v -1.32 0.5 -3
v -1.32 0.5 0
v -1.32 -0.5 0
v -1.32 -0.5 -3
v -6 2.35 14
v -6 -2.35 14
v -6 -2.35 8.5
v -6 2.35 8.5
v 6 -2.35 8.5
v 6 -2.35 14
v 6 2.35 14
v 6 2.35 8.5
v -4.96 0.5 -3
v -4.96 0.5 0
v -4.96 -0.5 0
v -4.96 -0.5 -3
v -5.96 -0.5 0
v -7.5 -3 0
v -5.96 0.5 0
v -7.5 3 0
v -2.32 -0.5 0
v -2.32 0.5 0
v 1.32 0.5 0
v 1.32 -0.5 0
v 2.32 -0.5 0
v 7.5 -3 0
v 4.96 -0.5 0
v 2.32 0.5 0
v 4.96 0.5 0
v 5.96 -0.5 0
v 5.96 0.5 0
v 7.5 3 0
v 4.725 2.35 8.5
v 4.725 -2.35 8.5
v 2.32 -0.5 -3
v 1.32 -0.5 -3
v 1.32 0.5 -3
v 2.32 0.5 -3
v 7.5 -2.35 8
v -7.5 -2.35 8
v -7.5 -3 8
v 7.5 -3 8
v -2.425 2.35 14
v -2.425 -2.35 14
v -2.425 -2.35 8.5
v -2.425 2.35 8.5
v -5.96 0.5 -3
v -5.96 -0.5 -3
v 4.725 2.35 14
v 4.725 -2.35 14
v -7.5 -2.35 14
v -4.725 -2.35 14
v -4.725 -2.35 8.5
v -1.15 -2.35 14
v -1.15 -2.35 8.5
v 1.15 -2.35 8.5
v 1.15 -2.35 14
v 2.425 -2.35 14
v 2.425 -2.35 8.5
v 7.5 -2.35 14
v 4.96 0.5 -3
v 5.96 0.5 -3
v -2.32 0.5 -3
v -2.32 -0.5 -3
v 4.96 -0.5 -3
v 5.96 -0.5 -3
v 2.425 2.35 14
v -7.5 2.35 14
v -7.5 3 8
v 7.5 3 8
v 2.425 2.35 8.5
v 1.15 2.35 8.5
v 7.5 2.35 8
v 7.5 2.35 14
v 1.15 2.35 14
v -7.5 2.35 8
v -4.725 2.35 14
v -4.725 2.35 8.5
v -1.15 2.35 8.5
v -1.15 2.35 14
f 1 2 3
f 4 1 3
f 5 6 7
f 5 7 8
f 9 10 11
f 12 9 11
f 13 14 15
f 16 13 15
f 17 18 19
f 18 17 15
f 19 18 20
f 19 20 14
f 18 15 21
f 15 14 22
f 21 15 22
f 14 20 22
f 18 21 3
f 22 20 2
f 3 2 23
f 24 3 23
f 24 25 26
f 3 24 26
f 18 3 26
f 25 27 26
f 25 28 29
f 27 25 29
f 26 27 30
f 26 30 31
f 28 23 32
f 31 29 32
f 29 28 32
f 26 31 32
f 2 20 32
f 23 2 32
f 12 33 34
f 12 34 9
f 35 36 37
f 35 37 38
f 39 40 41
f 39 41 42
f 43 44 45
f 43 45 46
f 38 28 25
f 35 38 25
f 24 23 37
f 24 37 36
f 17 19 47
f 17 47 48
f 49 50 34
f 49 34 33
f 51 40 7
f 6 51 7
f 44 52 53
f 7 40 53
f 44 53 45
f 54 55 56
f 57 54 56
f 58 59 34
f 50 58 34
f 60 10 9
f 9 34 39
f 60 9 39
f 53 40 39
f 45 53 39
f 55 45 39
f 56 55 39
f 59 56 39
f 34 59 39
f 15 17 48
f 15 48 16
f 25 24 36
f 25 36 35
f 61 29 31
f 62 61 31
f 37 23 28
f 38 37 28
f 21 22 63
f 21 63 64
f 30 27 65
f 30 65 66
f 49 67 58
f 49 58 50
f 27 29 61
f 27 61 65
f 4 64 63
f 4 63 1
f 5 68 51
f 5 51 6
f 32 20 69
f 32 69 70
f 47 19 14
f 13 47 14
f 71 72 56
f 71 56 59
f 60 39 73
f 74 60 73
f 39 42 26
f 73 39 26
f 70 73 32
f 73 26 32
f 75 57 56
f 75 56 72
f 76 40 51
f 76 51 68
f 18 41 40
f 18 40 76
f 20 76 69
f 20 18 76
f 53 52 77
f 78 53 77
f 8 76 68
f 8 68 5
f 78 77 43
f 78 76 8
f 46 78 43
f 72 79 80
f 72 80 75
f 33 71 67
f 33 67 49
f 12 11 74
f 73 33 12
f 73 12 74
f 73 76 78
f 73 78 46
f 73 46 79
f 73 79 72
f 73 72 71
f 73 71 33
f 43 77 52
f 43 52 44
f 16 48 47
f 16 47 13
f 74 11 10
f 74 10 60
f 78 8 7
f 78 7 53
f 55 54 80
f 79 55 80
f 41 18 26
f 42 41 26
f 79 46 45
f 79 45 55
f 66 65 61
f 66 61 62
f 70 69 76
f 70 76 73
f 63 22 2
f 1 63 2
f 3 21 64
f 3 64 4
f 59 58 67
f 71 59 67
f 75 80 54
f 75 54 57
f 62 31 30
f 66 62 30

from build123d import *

# Parameters (mm, degrees)
SKETCH_W     = 15
SKETCH_H     = 6
PAD_DEPTH    = 8
SKETCH001_W  = 15
SKETCH001_H  = 4.7
PAD001_DEPTH = 6
SKETCH003_W  = 1.275
SKETCH003_H  = 4.7
POCKET_DEPTH = 5.5
SKETCH004_W  = 1
SKETCH004_H  = 1
PAD002_DEPTH = 3


with BuildPart() as part:
    # Sketch → Pad (new body)
    with BuildSketch(Plane.XY):
        Rectangle(SKETCH_W, SKETCH_H)
    extrude(amount=PAD_DEPTH)

    # Sketch001 (on Face6 of Pad) → Pad001 (join)
    with BuildSketch(Plane.XY.offset(8)):
        Rectangle(SKETCH001_W, SKETCH001_H)
    extrude(amount=PAD001_DEPTH)

    # Sketch003 (on Face12 of Pad001) → Pocket (cut)
    with BuildSketch(Plane.XY.offset(14)):
        with Locations((1.7875, 0)):
            Rectangle(SKETCH003_W, SKETCH003_H)
        with Locations((5.3625, 0)):
            Rectangle(SKETCH003_W, SKETCH003_H)
        with Locations((-1.7875, 0)):
            Rectangle(SKETCH003_W, SKETCH003_H)
        with Locations((-5.3625, 0)):
            Rectangle(SKETCH003_W, SKETCH003_H)
    extrude(amount=-POCKET_DEPTH, mode=Mode.SUBTRACT)

    # Sketch004 (on Face4 of Pocket) → Pad002 (join)
    with BuildSketch(Plane(origin=(0, 0, 0), x_dir=(1, 0, 0), z_dir=(0, 0, -1))):
        with Locations((-1.82, 0)):
            Rectangle(SKETCH004_W, SKETCH004_H)
        with Locations((-5.46, 0)):
            Rectangle(SKETCH004_W, SKETCH004_H)
        with Locations((1.82, 0)):
            Rectangle(SKETCH004_W, SKETCH004_H)
        with Locations((5.46, 0)):
            Rectangle(SKETCH004_W, SKETCH004_H)
    extrude(amount=PAD002_DEPTH)


solid = part.part
